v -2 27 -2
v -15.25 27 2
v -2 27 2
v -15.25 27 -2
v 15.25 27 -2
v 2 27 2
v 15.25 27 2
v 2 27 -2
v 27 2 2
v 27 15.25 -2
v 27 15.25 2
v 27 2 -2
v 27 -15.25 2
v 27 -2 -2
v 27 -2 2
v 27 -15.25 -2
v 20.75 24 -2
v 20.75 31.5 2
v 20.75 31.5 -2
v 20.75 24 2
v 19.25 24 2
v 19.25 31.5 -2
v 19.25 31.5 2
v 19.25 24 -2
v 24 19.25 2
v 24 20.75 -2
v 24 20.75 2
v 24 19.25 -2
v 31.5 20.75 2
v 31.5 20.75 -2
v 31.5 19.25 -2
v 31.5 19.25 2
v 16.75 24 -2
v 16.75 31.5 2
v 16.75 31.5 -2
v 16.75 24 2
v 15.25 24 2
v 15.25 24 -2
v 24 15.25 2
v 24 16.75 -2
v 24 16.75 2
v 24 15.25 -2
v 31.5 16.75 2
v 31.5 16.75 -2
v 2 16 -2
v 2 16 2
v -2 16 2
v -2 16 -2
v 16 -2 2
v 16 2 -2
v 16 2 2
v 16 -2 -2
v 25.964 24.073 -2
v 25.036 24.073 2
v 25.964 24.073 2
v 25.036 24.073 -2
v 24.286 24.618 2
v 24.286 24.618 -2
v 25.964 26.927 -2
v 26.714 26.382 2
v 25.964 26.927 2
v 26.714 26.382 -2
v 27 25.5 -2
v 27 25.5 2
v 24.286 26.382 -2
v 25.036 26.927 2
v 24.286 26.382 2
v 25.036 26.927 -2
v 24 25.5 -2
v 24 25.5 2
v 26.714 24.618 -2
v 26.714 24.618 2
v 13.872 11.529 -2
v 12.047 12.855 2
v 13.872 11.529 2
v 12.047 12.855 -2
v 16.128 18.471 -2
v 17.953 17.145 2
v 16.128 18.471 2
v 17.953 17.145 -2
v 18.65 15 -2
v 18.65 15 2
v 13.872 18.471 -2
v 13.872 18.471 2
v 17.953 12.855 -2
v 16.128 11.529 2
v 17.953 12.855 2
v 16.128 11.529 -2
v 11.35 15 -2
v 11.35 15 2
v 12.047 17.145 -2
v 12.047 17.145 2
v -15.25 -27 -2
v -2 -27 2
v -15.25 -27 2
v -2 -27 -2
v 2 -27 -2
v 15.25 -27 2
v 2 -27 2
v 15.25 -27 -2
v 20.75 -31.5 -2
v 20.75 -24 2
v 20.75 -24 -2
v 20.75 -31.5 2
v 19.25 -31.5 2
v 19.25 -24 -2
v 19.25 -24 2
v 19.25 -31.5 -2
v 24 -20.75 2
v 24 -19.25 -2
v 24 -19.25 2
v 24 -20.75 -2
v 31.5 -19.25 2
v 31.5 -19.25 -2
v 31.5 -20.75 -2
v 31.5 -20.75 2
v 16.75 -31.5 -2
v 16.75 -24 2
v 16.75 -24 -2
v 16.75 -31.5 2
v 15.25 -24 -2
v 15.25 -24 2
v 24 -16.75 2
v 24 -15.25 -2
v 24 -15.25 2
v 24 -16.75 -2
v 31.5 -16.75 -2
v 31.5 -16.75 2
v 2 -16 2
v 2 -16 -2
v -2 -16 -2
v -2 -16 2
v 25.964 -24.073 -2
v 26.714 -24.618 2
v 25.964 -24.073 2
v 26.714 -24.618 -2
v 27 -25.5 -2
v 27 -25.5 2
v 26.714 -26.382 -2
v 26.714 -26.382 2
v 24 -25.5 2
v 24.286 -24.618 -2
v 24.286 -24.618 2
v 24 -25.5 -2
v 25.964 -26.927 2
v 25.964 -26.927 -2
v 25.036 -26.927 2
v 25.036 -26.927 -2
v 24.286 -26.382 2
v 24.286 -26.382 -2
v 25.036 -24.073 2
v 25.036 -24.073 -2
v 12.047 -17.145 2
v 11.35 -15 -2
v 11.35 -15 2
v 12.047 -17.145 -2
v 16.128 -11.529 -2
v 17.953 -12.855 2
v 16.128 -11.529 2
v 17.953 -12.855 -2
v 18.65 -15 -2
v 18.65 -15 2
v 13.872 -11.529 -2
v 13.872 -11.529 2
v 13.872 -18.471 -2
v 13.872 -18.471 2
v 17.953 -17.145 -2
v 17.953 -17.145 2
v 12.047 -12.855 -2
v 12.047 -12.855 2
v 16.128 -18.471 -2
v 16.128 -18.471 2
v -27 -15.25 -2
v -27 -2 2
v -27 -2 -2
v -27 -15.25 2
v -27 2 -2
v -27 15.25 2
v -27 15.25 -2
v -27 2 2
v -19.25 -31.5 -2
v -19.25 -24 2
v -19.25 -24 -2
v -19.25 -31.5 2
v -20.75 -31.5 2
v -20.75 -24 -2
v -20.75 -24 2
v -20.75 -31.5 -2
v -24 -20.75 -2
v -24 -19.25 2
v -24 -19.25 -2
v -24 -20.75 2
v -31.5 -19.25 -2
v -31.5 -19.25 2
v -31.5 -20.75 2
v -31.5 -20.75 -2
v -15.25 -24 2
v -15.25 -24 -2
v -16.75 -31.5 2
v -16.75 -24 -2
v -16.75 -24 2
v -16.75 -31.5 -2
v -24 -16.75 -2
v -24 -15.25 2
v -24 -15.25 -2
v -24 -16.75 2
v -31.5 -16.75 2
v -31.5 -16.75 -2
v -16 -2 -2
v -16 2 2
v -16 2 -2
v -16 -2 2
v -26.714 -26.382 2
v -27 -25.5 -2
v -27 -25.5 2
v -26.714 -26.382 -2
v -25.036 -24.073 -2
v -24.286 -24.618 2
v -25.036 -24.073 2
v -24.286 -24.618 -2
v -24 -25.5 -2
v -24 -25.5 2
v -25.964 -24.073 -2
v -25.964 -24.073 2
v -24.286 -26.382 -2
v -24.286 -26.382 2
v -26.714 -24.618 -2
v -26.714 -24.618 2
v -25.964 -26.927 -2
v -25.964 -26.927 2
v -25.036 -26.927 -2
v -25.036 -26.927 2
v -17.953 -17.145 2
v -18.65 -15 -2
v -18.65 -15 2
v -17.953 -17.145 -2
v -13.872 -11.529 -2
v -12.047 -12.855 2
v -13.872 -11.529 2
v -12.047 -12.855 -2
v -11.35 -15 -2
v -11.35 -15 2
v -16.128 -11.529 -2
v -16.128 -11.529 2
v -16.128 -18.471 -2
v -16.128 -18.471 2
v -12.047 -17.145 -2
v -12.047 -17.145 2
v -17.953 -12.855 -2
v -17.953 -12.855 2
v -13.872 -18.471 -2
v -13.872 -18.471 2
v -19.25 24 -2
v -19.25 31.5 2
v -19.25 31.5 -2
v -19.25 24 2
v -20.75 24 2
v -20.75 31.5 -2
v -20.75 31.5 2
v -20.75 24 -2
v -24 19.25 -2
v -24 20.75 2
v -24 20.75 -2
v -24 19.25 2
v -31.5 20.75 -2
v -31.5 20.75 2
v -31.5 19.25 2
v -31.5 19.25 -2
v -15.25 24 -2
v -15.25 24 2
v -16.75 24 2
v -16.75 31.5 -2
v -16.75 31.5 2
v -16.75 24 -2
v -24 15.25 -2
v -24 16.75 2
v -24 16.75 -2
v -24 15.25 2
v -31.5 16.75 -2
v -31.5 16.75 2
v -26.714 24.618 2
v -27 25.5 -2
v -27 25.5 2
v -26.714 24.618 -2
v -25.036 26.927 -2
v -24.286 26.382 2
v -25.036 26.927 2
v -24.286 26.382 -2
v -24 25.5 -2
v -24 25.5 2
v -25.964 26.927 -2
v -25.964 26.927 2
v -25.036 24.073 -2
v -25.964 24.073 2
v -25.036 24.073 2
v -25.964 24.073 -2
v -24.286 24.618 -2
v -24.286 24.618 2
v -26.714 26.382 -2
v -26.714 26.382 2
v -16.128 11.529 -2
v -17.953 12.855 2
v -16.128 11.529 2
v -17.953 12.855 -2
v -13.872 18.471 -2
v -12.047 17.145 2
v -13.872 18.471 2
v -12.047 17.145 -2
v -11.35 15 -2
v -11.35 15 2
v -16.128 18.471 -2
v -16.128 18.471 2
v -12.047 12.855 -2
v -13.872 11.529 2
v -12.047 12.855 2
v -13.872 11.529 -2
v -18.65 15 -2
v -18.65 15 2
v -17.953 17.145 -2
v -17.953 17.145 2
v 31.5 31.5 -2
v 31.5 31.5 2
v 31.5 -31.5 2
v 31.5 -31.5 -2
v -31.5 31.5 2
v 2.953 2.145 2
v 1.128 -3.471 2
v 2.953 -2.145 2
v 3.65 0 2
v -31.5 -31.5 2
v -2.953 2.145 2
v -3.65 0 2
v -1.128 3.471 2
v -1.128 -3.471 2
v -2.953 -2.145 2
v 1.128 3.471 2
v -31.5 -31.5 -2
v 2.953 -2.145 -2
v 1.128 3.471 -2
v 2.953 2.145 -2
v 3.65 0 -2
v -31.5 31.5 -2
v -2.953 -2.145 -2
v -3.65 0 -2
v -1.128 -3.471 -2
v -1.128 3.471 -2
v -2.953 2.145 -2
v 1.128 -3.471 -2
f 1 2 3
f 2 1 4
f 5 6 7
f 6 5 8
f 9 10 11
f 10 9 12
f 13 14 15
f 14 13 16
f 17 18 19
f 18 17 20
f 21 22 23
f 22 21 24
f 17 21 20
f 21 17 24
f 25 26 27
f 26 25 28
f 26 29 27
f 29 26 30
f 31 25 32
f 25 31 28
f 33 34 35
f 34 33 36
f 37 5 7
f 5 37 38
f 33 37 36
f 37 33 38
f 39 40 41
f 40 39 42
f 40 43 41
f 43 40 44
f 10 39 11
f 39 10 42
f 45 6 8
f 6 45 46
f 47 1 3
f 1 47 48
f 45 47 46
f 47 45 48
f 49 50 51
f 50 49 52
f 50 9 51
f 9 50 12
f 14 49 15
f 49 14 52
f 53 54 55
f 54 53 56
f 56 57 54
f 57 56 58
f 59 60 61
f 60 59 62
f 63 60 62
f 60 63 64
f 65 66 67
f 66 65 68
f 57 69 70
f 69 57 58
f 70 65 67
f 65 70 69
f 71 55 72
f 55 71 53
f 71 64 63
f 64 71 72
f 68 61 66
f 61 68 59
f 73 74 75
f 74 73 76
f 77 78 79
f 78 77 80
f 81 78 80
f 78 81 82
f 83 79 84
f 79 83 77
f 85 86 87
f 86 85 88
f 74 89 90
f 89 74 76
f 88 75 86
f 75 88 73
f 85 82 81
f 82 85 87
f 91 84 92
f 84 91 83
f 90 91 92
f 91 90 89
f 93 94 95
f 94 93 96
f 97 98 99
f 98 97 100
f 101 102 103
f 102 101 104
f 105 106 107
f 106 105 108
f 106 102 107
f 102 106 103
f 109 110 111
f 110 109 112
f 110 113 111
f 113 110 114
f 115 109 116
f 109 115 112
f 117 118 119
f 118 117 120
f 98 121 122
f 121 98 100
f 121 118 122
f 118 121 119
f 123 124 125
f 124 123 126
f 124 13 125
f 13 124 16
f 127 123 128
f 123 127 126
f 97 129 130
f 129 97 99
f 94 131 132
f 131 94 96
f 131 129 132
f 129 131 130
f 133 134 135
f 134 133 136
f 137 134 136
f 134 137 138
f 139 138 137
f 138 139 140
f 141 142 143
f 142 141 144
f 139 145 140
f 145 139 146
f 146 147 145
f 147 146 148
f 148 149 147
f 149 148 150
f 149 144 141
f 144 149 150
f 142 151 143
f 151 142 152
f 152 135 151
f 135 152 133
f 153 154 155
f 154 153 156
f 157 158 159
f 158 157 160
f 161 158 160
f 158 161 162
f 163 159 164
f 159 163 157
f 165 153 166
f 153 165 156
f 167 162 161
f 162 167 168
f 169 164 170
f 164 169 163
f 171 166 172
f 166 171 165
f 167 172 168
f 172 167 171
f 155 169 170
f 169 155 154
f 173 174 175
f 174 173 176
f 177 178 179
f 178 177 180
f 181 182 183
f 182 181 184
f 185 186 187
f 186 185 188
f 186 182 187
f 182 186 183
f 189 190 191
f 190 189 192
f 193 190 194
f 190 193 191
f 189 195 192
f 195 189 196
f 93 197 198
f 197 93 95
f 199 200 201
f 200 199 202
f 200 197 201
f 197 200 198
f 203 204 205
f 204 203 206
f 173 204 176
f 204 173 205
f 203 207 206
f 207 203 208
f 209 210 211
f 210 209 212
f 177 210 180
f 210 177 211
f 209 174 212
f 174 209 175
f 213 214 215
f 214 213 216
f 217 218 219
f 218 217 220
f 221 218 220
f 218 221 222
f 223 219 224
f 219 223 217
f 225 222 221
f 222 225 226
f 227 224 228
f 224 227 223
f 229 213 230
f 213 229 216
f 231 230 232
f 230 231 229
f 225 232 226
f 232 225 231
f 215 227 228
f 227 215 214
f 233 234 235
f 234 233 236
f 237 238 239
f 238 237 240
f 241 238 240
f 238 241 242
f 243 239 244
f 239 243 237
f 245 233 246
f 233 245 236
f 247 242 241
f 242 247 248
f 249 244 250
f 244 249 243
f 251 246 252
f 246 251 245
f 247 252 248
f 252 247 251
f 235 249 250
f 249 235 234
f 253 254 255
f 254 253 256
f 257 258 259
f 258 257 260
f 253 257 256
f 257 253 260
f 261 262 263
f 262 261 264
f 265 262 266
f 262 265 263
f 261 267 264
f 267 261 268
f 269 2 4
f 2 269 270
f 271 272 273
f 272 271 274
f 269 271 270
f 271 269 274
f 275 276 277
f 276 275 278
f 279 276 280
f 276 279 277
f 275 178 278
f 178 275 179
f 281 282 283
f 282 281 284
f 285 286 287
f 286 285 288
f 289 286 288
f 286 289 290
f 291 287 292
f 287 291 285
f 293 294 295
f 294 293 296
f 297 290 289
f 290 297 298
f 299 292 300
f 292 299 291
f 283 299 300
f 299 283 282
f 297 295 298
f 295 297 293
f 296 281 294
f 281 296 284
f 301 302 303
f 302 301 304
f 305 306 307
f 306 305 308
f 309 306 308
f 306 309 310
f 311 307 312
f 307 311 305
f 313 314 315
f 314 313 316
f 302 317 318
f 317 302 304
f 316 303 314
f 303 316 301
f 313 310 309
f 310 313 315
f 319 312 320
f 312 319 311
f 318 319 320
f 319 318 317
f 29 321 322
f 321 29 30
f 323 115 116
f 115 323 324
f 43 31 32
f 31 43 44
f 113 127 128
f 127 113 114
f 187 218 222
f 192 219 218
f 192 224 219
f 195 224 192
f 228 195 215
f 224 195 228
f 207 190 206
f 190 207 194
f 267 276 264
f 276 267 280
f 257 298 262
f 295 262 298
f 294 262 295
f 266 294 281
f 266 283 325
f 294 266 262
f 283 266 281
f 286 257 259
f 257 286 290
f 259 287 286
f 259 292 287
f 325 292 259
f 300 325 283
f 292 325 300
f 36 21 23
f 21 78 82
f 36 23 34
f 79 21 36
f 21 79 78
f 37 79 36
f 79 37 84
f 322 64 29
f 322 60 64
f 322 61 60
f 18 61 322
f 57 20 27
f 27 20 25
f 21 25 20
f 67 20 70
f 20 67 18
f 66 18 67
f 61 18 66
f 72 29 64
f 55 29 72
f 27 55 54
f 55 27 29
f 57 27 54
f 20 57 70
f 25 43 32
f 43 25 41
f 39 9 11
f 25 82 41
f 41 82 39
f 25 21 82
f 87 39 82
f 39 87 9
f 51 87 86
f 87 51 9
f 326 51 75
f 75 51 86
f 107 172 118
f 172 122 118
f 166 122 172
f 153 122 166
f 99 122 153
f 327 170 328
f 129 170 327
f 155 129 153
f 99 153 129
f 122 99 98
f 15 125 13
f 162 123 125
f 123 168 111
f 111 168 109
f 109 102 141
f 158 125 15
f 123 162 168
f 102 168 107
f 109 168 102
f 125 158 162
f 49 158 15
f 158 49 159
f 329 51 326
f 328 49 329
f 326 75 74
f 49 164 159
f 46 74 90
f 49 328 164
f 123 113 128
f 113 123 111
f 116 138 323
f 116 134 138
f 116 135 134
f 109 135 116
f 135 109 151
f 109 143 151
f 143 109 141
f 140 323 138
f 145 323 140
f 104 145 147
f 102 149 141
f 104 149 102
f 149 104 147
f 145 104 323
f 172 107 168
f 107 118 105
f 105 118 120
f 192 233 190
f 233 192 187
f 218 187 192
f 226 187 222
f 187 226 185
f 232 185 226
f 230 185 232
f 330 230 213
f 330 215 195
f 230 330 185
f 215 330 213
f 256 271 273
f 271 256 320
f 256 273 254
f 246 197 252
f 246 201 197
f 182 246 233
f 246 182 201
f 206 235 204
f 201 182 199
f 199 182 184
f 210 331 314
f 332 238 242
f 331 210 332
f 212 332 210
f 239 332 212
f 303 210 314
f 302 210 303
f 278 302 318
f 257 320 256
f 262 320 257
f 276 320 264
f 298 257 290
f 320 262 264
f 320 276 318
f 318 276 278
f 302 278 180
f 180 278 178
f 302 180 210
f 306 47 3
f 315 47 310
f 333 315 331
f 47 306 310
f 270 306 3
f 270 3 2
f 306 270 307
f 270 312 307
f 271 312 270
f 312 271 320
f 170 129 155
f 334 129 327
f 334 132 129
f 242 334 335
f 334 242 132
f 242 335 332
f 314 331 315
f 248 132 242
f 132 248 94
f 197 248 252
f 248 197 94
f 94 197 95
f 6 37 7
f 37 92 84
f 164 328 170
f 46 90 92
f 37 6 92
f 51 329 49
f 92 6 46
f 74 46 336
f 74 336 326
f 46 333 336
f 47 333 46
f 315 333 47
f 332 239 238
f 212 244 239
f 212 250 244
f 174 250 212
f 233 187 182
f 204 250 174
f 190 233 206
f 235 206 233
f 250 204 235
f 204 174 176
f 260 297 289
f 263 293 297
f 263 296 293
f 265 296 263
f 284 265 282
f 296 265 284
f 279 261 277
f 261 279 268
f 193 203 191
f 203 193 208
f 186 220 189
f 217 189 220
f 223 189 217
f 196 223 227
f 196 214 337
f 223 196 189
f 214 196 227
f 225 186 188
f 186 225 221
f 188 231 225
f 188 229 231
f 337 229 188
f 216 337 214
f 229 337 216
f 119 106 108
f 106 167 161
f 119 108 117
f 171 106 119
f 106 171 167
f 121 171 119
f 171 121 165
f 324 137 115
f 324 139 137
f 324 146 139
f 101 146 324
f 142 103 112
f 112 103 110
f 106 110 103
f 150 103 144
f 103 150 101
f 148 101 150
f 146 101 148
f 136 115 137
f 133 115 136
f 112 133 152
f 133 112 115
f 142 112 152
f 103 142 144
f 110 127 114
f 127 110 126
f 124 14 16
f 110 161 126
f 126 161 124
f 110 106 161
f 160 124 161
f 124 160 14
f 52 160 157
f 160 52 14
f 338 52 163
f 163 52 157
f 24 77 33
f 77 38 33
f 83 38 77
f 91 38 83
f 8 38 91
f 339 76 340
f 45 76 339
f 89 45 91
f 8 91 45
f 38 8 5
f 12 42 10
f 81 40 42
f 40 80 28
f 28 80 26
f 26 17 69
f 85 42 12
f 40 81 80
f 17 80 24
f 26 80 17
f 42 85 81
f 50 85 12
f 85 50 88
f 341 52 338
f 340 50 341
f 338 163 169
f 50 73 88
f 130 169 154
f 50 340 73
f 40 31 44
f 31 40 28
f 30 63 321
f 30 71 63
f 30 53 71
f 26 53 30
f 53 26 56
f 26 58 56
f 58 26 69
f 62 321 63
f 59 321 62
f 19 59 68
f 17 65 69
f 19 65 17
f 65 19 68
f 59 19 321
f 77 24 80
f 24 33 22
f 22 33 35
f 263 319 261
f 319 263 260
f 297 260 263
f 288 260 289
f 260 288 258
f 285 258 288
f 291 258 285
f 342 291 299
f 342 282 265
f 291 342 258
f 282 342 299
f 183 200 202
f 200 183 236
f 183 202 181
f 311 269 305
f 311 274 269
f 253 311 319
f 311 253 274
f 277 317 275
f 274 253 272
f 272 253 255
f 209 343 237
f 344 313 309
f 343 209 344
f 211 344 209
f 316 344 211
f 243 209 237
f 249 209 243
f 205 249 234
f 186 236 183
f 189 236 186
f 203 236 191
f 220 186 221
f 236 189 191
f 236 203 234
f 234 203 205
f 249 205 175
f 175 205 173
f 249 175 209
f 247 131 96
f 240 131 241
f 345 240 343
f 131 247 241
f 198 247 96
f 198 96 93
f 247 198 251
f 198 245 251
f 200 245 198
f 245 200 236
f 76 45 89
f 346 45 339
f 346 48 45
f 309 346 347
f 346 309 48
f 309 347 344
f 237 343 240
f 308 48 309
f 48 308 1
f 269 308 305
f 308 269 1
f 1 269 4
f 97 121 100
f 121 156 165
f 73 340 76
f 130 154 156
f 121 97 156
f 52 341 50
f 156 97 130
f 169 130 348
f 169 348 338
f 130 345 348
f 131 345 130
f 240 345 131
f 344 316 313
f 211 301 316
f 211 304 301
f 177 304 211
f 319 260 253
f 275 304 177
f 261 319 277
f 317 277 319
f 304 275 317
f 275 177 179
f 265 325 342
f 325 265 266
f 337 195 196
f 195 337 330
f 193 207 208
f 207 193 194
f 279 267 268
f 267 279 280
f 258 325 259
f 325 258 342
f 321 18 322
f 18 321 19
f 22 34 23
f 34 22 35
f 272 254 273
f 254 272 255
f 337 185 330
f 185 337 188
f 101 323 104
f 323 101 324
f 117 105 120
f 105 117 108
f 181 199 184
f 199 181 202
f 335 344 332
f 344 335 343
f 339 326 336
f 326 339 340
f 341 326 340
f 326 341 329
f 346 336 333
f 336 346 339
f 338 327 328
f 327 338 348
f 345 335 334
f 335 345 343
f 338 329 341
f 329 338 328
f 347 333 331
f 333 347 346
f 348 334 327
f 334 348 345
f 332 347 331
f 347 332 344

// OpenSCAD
module yquadrant(xquad, yquad)
{
	// Big cutout
	translate([0,29.5*yquad,0]) 
		cube(size=[32,5,5], center=true);
	translate([29.5*xquad,0,0]) 
		cube(size=[5,32,5], center=true);

	// edge slots
	translate([20*xquad, 28*yquad,0]) 
		cube(size=[1.5,8,5], center=true);
	translate([28*xquad, 20*yquad,0]) 
		cube(size=[8,1.5,5], center=true);

	translate([16*xquad, 28*yquad,0]) 
		cube(size=[1.5,8,5], center=true);
	translate([28*xquad, 16*yquad,0]) 
		cube(size=[8,1.5,5], center=true);
	
	// middle slot
	translate([0,22*yquad,0])
		cube(size=[4, 12, 5], center=true);
	translate([22*xquad,0,0])
		cube(size=[12, 4, 5], center=true);

	// little hole for quadrant
	translate([25.5*xquad, 25.5*yquad, 0]) 
		cylinder(h=5, r=3.0/2, center=true, $fn=10);

	// big hole for quadrant
	translate([15*xquad, 15*yquad, 0]) 
		cylinder(h=5, r=7.3/2, center=true, $fn=10);
}


module cutouts()
{
	difference()
	{
		cube(size=[63,63,4], center=true);	
		
		// Y Axis quadrants
		yquadrant(1,1);
		yquadrant(1,-1);
		yquadrant(-1,-1);
		yquadrant(-1,1);
		
		// Center hole
		cylinder(h=5, r=7.3/2, center=true, $fn=10);
	}
}

module yquaddimple(xquad, yquad)
{
	union()
	{	
		translate([17*xquad, 30*yquad,0])
			sphere(r=1, $fn=10);
		translate([30*xquad, 17*yquad,0])
			sphere(r=1, $fn=10);
	}

}

module dimples()
{
	yquaddimple(1,1);
	yquaddimple(1,-1);
	yquaddimple(-1,-1);
	yquaddimple(-1,1);
}



cutouts();
//dimples();
